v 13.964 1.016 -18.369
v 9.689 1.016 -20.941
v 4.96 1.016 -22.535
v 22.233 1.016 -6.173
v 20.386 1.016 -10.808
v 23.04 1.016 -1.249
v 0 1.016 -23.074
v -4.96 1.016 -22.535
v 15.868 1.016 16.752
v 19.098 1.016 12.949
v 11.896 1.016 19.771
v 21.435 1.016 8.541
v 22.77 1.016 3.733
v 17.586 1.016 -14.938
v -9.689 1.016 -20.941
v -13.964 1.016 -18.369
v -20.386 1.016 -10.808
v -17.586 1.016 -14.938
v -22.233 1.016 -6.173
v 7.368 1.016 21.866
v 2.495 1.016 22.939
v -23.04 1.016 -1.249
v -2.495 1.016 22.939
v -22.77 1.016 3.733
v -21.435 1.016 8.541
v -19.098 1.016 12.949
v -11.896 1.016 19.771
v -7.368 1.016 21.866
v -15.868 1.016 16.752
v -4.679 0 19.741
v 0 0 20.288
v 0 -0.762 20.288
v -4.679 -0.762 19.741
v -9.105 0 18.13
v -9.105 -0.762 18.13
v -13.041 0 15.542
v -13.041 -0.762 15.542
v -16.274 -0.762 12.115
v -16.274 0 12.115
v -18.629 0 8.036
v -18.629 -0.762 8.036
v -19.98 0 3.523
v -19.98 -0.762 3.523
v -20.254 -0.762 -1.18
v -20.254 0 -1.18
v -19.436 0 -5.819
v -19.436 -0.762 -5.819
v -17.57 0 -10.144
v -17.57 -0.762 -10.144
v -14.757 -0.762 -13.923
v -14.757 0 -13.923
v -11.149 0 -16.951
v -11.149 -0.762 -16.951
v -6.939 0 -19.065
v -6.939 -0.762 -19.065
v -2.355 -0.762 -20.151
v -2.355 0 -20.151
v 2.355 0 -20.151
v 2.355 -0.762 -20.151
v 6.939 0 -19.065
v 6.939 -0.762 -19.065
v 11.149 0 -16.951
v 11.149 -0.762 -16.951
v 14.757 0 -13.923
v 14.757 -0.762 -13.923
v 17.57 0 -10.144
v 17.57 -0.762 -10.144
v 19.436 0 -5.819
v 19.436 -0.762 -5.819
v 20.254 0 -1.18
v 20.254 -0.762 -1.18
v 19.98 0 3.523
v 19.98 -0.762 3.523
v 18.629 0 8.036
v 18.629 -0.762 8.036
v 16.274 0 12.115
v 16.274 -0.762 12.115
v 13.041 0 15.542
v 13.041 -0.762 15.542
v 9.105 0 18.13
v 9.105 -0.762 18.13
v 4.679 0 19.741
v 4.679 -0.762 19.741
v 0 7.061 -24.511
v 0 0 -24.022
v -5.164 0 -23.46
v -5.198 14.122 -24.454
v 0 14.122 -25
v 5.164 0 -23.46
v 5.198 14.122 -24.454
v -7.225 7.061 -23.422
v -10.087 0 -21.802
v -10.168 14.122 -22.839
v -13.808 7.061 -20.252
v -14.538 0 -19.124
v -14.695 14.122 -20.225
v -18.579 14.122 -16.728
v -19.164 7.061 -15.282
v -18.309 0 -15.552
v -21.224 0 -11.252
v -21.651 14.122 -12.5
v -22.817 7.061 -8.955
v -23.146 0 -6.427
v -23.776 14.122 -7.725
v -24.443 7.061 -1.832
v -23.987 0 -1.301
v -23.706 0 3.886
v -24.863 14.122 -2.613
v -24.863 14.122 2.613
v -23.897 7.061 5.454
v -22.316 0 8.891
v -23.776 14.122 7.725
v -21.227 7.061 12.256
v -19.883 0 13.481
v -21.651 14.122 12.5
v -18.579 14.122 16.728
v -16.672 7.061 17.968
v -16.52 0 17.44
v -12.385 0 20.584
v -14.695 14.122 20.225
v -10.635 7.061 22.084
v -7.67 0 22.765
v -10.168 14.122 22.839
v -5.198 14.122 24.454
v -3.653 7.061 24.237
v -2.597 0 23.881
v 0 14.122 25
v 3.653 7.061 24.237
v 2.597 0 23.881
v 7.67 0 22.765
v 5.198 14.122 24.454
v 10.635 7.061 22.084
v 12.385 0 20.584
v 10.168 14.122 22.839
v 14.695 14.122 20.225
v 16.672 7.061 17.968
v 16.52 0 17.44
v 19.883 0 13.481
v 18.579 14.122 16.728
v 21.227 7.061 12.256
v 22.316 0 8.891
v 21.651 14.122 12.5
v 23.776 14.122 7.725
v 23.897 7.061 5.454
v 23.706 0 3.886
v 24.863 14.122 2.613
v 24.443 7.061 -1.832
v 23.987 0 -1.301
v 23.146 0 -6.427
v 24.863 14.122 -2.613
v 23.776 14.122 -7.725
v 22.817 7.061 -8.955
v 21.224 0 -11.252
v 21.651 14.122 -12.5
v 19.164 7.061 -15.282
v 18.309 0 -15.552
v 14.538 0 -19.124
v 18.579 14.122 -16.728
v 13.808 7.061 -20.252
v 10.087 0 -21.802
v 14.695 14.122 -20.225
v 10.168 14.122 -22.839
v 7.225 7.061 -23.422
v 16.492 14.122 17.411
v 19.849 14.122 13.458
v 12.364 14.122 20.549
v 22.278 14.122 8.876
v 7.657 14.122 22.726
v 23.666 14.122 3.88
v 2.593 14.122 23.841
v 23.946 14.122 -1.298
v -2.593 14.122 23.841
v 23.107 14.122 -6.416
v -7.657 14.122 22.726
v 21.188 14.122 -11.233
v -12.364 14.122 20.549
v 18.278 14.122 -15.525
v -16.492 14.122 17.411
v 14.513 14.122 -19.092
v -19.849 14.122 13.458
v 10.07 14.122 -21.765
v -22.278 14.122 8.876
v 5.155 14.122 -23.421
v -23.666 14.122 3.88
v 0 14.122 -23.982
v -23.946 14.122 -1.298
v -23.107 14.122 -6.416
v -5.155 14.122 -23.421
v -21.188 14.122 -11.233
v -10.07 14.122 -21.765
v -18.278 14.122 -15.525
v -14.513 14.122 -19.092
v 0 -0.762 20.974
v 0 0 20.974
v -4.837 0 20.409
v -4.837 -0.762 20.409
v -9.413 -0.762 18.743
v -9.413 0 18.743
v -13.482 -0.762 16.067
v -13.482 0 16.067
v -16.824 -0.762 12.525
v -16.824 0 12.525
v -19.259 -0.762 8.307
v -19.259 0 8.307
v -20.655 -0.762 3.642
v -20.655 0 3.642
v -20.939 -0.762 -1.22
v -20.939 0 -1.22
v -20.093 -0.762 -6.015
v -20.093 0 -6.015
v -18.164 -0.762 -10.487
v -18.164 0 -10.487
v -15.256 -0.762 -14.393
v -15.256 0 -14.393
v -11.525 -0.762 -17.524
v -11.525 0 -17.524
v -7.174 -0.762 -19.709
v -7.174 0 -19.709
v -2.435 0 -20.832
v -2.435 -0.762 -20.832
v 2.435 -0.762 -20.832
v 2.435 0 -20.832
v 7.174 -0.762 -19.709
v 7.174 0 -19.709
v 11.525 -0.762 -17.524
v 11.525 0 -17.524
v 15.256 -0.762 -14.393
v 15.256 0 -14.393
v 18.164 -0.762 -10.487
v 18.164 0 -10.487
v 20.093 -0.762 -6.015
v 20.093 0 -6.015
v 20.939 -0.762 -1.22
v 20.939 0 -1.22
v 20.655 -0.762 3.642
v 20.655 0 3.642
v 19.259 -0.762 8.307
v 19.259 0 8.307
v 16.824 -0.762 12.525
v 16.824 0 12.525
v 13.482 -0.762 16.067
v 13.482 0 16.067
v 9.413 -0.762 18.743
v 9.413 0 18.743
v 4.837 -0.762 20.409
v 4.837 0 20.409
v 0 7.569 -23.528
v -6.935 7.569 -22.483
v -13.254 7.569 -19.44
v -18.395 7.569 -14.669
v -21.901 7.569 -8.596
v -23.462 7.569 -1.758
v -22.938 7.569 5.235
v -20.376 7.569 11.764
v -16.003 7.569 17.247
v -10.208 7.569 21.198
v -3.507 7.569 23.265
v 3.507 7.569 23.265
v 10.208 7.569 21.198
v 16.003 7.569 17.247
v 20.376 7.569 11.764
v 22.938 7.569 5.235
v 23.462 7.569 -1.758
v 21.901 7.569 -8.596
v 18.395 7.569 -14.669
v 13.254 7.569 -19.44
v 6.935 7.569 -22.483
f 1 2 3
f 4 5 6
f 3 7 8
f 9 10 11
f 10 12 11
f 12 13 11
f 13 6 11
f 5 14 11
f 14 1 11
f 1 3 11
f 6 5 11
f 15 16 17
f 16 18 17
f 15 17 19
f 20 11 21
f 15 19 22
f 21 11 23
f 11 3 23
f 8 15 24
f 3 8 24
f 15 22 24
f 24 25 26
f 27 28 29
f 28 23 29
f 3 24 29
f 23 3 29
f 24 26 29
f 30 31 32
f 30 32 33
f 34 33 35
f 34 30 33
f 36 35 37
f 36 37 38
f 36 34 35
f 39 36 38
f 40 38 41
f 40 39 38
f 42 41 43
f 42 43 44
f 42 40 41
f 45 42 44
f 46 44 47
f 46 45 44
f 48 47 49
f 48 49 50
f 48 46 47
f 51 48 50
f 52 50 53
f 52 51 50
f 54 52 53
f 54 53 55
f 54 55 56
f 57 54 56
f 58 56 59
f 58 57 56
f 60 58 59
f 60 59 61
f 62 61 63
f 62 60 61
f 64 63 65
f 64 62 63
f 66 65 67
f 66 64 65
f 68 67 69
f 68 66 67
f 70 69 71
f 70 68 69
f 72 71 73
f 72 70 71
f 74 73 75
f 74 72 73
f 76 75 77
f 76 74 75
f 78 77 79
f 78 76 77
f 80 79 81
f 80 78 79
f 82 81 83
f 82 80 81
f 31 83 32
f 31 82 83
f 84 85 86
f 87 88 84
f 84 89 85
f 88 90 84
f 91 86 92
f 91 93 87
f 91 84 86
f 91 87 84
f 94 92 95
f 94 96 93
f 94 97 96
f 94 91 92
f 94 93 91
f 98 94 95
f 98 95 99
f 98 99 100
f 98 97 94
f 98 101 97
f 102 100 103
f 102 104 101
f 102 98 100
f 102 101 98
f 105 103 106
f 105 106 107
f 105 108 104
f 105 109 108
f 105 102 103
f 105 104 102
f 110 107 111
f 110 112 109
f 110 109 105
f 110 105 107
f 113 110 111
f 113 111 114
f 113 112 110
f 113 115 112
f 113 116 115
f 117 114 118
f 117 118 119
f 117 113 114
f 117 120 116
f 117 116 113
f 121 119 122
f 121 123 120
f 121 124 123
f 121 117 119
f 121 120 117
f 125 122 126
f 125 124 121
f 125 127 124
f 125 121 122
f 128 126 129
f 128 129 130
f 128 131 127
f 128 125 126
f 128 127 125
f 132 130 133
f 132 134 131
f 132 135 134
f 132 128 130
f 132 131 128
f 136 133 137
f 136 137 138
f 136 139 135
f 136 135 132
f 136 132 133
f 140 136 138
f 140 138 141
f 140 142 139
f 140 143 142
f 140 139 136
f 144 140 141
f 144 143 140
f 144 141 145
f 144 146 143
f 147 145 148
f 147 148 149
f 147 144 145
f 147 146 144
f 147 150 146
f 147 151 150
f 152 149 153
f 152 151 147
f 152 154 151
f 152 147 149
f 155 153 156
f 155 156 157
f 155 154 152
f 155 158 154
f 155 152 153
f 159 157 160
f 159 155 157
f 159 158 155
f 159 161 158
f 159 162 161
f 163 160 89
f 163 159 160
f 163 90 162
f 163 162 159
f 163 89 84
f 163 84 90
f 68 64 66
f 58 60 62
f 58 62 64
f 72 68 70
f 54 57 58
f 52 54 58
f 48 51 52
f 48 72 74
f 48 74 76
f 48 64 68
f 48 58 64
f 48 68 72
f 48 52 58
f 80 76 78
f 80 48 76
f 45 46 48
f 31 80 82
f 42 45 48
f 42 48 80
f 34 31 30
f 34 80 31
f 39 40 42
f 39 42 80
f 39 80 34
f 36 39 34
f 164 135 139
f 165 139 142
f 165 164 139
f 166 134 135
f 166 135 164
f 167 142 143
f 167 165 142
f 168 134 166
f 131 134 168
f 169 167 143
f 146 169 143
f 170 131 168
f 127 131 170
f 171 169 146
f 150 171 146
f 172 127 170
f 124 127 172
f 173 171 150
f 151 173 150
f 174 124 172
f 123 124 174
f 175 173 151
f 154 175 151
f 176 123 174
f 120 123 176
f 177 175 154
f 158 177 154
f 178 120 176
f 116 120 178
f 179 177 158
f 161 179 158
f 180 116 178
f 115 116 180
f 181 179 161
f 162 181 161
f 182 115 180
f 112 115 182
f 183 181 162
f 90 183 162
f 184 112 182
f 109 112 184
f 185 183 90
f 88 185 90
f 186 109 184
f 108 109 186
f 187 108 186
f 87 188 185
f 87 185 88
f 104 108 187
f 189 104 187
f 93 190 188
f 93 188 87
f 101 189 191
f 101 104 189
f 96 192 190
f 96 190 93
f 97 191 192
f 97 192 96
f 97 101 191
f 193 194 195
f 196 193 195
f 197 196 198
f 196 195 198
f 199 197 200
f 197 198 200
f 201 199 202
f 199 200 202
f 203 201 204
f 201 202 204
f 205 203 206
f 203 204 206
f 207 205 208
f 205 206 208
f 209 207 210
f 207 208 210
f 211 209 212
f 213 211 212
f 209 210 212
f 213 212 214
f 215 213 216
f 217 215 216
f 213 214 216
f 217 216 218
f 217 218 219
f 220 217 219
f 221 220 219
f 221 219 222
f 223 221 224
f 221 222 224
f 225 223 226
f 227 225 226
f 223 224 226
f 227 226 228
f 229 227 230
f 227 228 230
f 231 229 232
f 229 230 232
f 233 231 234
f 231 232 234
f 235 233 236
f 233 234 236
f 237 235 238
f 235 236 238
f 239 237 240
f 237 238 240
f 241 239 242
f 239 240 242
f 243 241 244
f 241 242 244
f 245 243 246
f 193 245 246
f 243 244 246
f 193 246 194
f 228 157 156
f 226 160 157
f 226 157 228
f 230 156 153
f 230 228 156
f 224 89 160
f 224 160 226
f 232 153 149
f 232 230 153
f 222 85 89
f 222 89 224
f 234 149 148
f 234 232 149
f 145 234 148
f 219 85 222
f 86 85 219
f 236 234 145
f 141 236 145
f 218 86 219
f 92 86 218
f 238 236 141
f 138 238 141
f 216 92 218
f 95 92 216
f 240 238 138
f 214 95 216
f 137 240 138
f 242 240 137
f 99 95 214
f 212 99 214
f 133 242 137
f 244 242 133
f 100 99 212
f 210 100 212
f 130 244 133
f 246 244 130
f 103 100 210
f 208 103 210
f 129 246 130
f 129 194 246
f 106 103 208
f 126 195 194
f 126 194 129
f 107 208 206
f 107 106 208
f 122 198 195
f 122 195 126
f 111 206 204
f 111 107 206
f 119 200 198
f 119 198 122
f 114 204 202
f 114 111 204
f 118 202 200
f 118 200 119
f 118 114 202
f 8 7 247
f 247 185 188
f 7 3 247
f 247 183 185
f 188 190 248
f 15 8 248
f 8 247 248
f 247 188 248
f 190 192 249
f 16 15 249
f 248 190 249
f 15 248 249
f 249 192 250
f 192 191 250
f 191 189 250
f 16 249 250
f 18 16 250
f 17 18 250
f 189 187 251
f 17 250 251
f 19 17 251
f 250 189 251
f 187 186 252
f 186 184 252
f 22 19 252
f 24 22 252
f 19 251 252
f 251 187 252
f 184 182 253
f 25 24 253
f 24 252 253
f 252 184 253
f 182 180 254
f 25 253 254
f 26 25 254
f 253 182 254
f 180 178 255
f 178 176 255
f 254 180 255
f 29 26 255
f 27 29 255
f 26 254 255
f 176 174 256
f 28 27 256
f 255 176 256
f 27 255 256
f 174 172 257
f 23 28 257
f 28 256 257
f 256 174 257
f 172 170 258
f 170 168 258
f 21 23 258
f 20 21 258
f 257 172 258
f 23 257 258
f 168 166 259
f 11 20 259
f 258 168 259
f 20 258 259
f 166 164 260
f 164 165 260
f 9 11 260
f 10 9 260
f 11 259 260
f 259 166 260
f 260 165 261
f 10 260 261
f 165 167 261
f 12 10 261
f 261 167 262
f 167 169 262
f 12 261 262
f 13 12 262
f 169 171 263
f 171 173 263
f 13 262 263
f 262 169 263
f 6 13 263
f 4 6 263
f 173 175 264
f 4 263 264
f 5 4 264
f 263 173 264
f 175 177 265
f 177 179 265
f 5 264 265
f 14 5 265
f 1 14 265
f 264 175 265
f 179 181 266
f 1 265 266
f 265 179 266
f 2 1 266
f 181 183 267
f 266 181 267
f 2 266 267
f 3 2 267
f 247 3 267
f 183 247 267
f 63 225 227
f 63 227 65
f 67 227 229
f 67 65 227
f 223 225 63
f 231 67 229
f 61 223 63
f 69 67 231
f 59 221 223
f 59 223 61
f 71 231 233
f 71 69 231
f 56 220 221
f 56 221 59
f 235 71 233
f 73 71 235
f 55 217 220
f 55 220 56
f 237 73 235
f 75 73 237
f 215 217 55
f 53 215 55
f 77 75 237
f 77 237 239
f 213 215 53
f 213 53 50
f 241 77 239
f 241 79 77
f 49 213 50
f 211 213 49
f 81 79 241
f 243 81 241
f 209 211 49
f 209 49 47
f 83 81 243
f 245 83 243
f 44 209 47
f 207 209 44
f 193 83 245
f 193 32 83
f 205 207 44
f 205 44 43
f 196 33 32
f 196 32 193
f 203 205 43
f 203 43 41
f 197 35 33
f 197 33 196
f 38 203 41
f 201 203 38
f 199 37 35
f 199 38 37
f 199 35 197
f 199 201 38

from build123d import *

# Parameters (mm, degrees)
SHELL1_T            = -1.016
SKETCH3_R           = 20.9741
SKETCH3_R_2         = 20.2883
BOSS_EXTRUDE1_DEPTH = 0.762


with BuildPart() as part:
    # Sketch2 → Revolve1 (revolve)
    with BuildSketch(Plane.XY, mode=Mode.PRIVATE) as revolve1_sk:
        Polygon((0, 0), (24.0221, 0), (25, 14.1224), (0, 14.1224), align=None)
    revolve(revolve1_sk.sketch.rotate(Axis((0, 0, 0), (0, 1, 0)), 90), axis=Axis((0, 0, 0), (0, 1, 0)))

    # Shell1
    shell1_openings = [part.faces().sort_by_distance(p)[0] for p in [
        (0, 14.1224, 0),
    ]]
    offset(amount=SHELL1_T, openings=shell1_openings, kind=Kind.INTERSECTION)

    # Sketch3 → Boss-Extrude1 (add)
    with BuildSketch(Plane.XZ):
        with Locations(Location((0, 0, 0), (0, 0, 90))):
            Circle(SKETCH3_R)
        with Locations(Location((0, 0, 0), (0, 0, 90))):
            Circle(SKETCH3_R_2, mode=Mode.SUBTRACT)
    extrude(amount=BOSS_EXTRUDE1_DEPTH)


solid = part.part
